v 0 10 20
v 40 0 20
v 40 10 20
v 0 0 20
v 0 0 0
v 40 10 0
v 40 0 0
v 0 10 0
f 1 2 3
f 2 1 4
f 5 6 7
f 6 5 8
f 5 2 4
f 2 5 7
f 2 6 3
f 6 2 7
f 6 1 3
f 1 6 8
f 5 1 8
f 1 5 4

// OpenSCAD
// MODEL NAME
// License: CC BY-NC-SA 4.0 (https://creativecommons.org/licenses/by-nc-sa/4.0/)

/* [Dimensions] */
width  = 40; // mm
height = 20; // mm
depth  = 10; // mm

cube([width, depth, height]);
